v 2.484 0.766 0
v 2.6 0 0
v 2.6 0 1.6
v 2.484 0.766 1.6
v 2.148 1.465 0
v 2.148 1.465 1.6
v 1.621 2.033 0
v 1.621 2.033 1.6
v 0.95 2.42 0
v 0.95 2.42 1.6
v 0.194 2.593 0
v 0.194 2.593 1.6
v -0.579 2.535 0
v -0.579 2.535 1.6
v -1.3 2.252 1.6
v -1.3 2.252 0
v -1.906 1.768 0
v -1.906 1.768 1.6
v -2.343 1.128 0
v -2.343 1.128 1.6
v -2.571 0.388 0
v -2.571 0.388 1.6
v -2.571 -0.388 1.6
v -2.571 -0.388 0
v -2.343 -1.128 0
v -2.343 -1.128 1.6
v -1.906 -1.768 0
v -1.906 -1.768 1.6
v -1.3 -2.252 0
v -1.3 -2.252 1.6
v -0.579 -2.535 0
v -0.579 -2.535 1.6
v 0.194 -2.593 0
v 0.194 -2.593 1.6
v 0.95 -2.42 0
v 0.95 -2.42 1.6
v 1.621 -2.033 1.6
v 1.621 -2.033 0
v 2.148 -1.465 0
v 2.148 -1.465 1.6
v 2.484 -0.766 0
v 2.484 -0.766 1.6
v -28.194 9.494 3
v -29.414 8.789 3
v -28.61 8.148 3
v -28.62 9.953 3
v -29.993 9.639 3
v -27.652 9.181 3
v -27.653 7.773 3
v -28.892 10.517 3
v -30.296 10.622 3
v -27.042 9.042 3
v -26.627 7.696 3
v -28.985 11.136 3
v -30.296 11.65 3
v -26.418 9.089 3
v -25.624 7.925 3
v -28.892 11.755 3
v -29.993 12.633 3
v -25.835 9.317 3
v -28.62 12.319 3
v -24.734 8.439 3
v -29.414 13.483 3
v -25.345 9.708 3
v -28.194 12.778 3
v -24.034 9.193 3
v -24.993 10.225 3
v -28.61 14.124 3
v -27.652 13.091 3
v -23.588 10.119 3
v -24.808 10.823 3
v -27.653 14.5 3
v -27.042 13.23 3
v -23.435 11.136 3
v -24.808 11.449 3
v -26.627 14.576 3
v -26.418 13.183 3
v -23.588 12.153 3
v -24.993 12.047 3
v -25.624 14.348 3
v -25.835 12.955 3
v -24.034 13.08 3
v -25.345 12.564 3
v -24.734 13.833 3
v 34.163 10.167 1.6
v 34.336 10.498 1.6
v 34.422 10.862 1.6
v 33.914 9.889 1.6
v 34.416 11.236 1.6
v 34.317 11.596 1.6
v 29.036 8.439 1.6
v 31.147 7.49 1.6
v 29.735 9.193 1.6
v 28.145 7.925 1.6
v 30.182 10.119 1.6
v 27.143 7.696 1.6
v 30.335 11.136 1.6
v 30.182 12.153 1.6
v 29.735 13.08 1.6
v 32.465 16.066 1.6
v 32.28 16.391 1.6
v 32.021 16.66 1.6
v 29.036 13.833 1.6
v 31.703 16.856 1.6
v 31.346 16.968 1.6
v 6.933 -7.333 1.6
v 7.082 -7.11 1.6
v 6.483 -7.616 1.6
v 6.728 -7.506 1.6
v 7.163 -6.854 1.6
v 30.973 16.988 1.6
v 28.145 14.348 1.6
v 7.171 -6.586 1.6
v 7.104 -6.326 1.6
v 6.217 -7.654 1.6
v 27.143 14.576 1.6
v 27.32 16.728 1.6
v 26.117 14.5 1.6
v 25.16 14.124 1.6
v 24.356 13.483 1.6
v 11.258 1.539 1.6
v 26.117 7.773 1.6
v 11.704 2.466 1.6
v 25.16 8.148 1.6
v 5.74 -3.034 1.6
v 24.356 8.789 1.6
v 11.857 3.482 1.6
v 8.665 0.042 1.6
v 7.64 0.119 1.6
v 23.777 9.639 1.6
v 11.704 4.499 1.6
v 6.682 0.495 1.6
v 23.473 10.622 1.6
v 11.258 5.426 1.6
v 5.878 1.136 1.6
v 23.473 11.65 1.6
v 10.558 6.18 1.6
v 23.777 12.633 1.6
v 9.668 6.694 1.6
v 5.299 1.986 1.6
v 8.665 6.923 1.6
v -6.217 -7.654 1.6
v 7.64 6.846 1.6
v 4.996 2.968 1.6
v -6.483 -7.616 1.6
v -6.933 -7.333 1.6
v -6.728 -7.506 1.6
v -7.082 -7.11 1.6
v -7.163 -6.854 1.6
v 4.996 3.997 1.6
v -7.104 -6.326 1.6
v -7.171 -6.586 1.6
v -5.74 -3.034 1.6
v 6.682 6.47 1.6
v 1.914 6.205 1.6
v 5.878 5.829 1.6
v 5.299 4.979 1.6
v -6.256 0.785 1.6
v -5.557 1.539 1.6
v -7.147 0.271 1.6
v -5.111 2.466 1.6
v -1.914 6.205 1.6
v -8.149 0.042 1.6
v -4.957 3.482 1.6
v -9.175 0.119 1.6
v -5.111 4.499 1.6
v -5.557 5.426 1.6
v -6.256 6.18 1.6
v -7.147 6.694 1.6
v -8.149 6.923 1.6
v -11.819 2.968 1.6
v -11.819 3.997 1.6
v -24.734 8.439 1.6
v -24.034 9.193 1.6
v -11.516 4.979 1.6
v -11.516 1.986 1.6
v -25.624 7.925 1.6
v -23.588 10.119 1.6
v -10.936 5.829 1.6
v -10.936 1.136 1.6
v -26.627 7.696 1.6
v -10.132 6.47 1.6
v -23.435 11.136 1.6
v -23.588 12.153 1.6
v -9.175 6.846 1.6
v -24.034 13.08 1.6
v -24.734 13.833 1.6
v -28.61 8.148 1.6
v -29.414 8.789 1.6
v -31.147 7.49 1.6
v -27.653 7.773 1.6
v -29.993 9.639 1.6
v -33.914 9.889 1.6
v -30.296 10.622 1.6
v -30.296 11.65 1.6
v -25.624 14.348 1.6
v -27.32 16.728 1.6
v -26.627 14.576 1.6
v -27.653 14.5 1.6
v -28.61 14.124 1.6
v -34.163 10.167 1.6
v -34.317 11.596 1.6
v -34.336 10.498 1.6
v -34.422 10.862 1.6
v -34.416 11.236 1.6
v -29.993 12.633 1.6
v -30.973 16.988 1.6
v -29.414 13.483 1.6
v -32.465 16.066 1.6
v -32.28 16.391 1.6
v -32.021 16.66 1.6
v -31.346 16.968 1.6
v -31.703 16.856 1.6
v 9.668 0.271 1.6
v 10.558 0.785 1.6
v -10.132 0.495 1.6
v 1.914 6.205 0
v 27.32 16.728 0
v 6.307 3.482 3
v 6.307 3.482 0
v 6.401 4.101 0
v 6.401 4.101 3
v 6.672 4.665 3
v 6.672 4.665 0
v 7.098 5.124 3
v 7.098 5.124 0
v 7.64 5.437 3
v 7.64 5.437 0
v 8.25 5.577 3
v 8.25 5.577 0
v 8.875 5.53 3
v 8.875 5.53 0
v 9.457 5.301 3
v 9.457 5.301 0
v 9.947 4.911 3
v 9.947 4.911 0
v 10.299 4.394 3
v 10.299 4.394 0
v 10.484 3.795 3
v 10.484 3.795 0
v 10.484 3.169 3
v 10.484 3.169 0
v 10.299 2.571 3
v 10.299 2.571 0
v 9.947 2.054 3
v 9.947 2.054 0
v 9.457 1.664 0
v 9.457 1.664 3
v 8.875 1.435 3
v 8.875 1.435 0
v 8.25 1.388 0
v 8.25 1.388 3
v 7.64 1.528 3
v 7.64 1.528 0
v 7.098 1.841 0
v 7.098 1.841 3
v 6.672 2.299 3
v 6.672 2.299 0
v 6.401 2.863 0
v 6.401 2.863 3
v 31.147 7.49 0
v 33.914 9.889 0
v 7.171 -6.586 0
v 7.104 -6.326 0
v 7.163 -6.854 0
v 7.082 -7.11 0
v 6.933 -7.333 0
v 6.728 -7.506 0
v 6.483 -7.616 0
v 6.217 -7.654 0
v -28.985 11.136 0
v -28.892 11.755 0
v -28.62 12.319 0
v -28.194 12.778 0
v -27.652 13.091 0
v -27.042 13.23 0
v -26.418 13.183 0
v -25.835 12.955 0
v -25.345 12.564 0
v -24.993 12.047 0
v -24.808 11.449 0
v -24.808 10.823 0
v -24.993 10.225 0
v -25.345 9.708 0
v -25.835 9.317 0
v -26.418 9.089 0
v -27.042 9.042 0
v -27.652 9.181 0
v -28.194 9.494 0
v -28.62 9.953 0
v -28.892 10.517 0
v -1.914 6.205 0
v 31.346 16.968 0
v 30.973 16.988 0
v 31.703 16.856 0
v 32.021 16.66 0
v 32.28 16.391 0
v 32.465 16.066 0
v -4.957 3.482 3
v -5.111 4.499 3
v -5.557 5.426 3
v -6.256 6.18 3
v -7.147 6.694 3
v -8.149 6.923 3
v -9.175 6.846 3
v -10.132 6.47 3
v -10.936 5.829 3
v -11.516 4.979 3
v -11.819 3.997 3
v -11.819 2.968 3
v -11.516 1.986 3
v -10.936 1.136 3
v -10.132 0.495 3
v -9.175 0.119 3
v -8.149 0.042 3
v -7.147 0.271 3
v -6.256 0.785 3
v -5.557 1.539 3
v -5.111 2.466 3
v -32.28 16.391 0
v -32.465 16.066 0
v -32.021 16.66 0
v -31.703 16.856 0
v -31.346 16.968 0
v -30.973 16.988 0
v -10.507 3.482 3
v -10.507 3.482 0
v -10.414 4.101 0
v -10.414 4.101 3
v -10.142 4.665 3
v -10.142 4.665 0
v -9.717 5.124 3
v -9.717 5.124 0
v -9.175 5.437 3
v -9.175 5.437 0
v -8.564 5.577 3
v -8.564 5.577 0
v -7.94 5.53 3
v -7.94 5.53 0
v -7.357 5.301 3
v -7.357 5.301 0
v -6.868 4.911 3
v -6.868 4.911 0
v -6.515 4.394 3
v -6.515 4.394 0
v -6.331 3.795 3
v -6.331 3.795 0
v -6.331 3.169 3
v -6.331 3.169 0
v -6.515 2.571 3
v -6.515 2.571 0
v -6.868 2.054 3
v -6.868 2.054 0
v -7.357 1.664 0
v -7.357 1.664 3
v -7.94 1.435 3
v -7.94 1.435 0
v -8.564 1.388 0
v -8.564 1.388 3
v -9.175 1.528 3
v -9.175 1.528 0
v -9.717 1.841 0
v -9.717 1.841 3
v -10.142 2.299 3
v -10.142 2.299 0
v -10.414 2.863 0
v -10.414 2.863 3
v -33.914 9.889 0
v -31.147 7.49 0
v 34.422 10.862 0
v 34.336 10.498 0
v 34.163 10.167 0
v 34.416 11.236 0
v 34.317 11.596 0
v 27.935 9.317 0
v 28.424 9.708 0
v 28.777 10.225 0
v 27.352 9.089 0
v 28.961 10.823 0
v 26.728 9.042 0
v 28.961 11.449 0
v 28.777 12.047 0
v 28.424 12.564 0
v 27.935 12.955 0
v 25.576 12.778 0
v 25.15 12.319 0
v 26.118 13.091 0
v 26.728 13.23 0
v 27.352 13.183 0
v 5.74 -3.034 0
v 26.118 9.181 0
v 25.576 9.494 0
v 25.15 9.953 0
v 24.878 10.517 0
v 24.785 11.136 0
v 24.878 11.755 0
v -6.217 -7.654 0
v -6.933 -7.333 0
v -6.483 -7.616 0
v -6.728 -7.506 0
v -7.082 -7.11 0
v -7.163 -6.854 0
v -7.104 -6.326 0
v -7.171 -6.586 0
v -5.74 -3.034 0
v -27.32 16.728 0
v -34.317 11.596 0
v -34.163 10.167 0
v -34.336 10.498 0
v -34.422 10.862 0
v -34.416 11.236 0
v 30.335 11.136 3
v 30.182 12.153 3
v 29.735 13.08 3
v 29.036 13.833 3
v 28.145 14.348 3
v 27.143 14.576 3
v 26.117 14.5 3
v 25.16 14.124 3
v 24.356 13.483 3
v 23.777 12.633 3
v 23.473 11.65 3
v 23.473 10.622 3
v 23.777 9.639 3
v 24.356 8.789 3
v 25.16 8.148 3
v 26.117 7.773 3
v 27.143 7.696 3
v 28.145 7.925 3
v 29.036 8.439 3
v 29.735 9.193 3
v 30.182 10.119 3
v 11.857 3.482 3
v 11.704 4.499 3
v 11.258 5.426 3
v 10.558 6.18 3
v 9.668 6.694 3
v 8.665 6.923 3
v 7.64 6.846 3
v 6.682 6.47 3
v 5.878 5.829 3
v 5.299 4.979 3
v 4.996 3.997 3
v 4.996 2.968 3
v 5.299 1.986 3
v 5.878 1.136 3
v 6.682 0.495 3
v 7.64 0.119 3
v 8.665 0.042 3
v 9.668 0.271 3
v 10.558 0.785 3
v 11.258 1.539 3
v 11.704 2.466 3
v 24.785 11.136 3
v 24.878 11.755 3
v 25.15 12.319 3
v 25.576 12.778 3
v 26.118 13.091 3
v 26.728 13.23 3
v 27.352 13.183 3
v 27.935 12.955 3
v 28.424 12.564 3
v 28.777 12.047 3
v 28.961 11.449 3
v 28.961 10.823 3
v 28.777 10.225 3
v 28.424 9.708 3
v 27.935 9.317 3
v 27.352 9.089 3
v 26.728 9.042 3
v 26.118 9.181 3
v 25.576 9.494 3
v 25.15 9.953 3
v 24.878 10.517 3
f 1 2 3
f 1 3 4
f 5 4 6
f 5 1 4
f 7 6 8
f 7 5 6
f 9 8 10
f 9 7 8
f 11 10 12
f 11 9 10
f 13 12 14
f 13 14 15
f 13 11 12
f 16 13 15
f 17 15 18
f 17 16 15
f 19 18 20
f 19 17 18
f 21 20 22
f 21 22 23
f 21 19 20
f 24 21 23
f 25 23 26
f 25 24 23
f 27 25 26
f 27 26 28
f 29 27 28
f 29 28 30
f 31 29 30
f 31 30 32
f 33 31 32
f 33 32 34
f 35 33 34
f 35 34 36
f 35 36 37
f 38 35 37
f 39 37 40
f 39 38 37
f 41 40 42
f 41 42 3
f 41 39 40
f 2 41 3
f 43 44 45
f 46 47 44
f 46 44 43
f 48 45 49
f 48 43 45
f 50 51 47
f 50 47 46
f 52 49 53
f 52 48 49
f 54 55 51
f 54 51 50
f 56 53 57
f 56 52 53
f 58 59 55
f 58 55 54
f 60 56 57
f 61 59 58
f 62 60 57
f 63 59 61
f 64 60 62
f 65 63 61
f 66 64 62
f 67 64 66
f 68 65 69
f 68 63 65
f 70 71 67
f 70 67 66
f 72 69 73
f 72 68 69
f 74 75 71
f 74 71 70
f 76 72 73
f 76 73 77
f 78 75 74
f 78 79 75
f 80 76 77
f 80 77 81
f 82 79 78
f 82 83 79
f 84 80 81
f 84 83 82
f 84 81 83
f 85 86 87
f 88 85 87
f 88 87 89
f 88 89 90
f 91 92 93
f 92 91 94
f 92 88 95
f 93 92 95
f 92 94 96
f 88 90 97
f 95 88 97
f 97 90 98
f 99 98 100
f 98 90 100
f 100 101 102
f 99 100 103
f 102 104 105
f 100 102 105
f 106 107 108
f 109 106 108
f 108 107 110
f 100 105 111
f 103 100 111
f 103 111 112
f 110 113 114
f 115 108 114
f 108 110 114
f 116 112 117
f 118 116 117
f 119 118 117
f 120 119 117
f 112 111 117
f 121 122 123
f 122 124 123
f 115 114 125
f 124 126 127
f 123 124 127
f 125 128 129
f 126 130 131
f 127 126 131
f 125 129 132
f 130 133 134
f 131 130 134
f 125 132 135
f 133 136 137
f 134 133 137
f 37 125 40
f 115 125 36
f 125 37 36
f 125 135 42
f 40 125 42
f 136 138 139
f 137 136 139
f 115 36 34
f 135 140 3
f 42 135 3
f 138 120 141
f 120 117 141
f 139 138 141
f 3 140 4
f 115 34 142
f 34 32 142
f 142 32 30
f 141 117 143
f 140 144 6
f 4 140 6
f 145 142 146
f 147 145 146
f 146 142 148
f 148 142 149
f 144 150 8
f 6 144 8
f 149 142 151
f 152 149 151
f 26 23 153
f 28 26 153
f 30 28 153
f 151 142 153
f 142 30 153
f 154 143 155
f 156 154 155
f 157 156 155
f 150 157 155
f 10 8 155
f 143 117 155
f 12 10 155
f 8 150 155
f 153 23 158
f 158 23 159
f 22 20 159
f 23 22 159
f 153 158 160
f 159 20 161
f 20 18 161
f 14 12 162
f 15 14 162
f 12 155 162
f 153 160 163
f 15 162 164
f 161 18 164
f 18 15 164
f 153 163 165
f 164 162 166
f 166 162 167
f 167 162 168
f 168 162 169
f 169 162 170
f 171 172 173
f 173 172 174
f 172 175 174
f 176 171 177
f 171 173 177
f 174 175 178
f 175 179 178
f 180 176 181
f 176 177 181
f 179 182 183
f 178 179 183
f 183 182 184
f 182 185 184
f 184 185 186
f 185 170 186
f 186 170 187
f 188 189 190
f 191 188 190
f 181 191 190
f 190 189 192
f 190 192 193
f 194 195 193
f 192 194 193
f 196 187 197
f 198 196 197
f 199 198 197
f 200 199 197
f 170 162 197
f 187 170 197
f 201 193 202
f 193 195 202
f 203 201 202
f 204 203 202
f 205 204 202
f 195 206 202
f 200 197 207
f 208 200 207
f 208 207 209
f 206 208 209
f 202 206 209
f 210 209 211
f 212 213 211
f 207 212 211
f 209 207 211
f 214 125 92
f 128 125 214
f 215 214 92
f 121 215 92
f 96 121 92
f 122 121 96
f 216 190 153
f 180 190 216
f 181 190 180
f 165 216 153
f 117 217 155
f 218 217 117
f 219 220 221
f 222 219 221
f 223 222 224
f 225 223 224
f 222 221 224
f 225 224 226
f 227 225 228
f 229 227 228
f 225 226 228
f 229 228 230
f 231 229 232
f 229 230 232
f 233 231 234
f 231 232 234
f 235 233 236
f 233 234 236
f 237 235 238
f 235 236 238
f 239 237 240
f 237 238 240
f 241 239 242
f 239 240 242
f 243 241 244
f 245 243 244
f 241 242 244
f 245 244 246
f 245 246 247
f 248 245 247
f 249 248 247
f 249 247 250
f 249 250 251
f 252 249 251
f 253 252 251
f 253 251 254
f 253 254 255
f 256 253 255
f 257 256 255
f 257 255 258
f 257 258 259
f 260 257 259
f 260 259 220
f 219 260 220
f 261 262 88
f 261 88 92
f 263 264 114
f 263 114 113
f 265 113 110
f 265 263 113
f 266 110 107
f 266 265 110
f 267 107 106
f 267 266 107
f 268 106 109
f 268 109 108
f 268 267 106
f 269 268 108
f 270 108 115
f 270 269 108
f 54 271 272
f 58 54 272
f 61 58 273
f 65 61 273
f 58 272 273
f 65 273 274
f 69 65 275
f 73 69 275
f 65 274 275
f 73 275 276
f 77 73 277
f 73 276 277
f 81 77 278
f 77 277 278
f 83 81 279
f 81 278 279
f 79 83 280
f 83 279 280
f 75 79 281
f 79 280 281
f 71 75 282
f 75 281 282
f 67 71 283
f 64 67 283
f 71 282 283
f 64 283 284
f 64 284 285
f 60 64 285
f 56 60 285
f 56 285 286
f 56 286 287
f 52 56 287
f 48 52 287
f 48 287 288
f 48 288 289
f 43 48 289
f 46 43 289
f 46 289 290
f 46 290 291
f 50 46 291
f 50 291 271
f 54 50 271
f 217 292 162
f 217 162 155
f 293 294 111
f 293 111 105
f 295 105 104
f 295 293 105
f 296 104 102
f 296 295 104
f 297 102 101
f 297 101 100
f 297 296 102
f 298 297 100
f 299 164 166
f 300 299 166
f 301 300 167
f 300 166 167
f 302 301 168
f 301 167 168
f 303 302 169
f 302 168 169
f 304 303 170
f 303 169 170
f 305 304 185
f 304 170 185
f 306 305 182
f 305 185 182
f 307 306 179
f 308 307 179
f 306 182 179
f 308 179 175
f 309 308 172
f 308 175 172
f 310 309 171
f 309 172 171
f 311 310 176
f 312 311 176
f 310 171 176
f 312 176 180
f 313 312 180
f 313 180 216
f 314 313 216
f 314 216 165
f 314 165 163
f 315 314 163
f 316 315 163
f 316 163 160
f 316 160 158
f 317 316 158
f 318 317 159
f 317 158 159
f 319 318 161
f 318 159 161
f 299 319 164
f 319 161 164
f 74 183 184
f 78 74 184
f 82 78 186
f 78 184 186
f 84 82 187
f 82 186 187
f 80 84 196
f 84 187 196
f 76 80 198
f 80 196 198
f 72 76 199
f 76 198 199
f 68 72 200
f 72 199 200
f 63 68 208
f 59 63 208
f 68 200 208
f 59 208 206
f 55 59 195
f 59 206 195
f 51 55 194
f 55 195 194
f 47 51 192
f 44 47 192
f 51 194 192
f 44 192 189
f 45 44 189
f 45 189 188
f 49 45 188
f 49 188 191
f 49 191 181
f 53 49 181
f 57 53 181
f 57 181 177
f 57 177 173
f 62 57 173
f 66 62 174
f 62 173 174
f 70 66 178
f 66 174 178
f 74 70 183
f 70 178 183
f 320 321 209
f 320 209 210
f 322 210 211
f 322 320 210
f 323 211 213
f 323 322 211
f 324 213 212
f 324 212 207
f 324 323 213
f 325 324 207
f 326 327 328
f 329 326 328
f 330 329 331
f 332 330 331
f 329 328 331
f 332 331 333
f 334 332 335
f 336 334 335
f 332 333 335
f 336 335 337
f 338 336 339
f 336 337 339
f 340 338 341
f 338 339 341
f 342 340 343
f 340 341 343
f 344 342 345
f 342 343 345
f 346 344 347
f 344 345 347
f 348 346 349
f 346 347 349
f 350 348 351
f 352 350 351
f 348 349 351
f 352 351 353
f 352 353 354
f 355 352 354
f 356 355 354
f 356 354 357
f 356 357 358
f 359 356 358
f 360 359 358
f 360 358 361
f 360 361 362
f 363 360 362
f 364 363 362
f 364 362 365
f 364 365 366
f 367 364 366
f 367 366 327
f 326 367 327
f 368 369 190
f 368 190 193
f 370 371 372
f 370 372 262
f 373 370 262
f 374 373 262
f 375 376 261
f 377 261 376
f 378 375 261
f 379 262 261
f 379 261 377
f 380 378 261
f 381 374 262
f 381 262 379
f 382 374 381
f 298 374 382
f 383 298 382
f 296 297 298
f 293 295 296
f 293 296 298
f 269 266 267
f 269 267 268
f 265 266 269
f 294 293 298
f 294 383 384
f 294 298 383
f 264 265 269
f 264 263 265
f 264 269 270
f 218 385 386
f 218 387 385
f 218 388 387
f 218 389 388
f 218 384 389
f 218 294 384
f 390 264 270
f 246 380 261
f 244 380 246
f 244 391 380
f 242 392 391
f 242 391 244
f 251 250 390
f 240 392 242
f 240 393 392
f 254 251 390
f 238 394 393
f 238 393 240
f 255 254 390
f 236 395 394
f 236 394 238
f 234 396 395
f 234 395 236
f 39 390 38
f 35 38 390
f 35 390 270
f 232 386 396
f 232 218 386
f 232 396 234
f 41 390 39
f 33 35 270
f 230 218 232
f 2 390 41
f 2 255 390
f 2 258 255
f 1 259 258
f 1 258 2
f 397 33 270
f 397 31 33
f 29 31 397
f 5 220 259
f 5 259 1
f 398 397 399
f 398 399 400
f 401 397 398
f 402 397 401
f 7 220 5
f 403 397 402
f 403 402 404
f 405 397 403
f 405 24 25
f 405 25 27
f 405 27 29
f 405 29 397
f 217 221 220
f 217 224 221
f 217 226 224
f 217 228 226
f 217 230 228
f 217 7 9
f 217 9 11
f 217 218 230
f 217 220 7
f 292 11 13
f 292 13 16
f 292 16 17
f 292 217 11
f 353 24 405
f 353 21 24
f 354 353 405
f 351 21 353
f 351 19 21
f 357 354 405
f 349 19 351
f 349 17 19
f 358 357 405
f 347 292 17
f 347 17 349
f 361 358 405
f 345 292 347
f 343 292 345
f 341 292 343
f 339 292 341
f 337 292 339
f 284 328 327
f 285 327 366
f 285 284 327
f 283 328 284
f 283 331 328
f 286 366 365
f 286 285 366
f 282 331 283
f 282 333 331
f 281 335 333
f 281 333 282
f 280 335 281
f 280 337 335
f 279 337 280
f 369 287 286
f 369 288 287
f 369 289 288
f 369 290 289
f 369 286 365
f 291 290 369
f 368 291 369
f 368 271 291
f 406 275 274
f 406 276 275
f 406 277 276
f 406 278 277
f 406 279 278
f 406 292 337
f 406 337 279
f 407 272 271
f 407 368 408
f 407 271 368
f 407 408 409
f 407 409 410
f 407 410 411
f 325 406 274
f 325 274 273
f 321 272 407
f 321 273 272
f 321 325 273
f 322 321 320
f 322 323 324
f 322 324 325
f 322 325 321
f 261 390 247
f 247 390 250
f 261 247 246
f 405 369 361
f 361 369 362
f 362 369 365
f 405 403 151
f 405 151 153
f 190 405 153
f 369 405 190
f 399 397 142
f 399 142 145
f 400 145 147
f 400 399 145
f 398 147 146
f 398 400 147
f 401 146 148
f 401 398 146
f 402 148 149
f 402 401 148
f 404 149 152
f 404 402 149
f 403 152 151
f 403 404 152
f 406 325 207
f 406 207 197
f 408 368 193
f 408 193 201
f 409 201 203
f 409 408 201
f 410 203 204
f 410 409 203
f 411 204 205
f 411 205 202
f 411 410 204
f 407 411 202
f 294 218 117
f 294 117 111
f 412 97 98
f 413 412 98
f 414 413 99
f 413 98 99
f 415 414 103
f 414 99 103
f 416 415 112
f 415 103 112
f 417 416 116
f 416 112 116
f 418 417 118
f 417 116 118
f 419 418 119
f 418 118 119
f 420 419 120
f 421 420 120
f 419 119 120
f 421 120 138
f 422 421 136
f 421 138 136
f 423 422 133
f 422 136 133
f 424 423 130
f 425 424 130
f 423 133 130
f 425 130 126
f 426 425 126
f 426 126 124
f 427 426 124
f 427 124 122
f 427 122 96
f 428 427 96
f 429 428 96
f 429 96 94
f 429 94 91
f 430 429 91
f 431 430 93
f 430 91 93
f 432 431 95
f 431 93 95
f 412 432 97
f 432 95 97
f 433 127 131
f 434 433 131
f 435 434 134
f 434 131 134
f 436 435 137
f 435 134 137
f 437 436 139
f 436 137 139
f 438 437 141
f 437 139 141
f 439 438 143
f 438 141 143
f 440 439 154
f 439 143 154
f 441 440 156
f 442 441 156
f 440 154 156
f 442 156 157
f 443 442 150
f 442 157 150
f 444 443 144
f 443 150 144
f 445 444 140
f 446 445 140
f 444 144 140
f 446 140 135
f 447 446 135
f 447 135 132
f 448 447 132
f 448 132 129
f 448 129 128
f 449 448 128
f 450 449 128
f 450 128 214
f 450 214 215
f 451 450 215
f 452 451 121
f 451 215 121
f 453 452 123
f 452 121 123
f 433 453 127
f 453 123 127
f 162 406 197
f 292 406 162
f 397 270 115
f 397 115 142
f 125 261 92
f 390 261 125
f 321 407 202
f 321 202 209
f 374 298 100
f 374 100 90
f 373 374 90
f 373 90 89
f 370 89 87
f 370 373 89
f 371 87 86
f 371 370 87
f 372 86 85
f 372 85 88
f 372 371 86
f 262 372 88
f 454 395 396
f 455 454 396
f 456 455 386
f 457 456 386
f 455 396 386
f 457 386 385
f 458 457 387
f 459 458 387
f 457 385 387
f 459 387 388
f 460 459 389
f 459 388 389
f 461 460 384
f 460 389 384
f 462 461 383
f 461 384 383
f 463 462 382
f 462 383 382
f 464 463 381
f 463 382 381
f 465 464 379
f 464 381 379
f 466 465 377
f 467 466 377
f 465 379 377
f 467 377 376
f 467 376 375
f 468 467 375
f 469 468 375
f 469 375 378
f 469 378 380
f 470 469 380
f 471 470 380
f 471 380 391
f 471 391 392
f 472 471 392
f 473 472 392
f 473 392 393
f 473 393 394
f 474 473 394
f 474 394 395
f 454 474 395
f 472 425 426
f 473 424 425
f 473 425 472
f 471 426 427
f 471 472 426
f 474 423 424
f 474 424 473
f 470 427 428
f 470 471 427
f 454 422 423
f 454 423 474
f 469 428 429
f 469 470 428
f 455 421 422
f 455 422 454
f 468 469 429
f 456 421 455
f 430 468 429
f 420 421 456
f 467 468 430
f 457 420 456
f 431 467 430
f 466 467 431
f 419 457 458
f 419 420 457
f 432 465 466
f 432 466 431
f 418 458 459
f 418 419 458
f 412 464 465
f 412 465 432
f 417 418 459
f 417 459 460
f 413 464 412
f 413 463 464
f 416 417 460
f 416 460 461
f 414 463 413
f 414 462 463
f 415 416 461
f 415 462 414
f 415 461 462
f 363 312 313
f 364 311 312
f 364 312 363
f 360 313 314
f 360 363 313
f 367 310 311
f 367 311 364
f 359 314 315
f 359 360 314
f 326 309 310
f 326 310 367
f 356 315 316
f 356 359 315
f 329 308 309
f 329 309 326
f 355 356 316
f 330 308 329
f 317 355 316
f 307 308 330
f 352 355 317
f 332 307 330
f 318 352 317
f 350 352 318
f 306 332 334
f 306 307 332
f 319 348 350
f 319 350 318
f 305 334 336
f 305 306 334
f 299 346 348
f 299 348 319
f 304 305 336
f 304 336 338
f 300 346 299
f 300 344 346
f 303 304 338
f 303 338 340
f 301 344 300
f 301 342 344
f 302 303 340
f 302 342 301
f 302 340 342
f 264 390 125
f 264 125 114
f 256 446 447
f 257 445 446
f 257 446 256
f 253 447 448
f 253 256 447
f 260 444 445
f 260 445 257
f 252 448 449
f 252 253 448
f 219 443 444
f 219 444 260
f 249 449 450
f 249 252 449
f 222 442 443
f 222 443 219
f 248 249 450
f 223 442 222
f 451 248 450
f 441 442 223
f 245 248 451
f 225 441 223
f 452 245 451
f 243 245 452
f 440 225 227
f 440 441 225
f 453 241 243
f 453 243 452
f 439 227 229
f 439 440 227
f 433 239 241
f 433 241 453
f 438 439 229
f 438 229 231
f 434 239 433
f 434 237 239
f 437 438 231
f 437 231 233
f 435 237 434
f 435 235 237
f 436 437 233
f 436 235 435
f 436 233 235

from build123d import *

# Parameters (mm, degrees)
SKETCH1_R             = 2.6
BOSS_EXTRUDE1_DEPTH   = 1.6
SKETCH2_R             = 3.45
BOSS_EXTRUDE2_DEPTH   = 1.4
M5X0_8_TAPPED_HOLE1_D = 4.2


with BuildPart() as part:
    # Sketch1 → Boss-Extrude1 (new body)
    with BuildSketch(Plane.XY):
        with BuildLine():
            Line((-1.9135, 6.204558653), (1.9135, 6.204558653))
            Line((1.9135, 6.204558653), (27.320187144, 16.728353043))
            Line((27.320187144, 16.728353043), (30.973251278, 16.987968318))
            ThreePointArc((30.973251278, 16.987968318), (31.868181477, 16.767718217), (32.465404107, 16.065767153))
            Line((32.465404107, 16.065767153), (34.316720297, 11.596294499))
            ThreePointArc((34.316720297, 11.596294499), (34.390774483, 10.67763997), (33.91370361, 9.889088418))
            Line((33.91370361, 9.889088418), (31.147021468, 7.489557718))
            Line((31.147021468, 7.489557718), (5.740334324, -3.034236672))
            Line((5.740334324, -3.034236672), (7.103934305, -6.32625824))
            ThreePointArc((7.103934305, -6.32625824), (7.015220781, -7.226981758), (6.217009953, -7.653634335))
            Line((6.217009953, -7.653634335), (-6.217009953, -7.653634335))
            ThreePointArc((-6.217009953, -7.653634335), (-7.015220781, -7.226981758), (-7.103934305, -6.32625824))
            Line((-7.103934305, -6.32625824), (-5.740334324, -3.034236672))
            Line((-5.740334324, -3.034236672), (-31.147021468, 7.489557718))
            Line((-31.147021468, 7.489557718), (-33.91370361, 9.889088418))
            ThreePointArc((-33.91370361, 9.889088418), (-34.390774483, 10.67763997), (-34.316720297, 11.596294499))
            Line((-34.316720297, 11.596294499), (-32.465404107, 16.065767153))
            ThreePointArc((-32.465404107, 16.065767153), (-31.868181477, 16.767718217), (-30.973251278, 16.987968318))
            Line((-30.973251278, 16.987968318), (-27.320187144, 16.728353043))
            Line((-27.320187144, 16.728353043), (-1.9135, 6.204558653))
        make_face()
        Circle(SKETCH1_R, mode=Mode.SUBTRACT)
    extrude(amount=BOSS_EXTRUDE1_DEPTH)

    # Sketch2 → Boss-Extrude2 (add)
    with BuildSketch(Plane.XY.offset(1.6)):
        with Locations((26.884894396, 11.136087882)):
            Circle(SKETCH2_R)
        with Locations((8.407303746, 3.482419235)):
            Circle(SKETCH2_R)
        with Locations((-8.407303746, 3.482419235)):
            Circle(SKETCH2_R)
        with Locations((-26.884894396, 11.136087882)):
            Circle(SKETCH2_R)
    extrude(amount=BOSS_EXTRUDE2_DEPTH)

    # M5x0.8 Tapped Hole1 (through all)
    with Locations(Plane.XY.offset(3)):
        with Locations((26.884894396, 11.136087882), (8.407303746, 3.482419235), (-8.407303746, 3.482419235), (-26.884894396, 11.136087882)):
            Hole(M5X0_8_TAPPED_HOLE1_D / 2)


solid = part.part
